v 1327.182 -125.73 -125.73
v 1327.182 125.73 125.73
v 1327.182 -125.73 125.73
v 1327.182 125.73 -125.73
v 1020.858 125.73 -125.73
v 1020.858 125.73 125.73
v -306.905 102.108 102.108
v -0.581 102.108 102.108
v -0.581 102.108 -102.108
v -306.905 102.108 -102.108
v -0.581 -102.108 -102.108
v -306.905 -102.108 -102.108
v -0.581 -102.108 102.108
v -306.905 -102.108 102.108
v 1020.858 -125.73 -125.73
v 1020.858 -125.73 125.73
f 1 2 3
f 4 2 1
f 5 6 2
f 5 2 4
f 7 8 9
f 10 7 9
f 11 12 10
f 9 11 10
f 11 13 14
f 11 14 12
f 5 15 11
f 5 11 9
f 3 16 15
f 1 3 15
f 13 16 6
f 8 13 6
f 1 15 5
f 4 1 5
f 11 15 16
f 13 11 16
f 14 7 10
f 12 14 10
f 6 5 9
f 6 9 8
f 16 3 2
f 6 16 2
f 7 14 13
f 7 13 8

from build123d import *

# Parameters (mm, degrees)
LOFT1_OUTLINE_W     = 204.216
LOFT1_OUTLINE_H     = 204.216
LOFT1_DEPTH         = 1021.439287055
LOFT1_DRAFT         = -1.324797
SKETCH3_2_W         = 251.46
SKETCH3_2_H         = 251.46
BOSS_EXTRUDE1_DEPTH = 306.324
SKETCH2_2_W         = 204.216
SKETCH2_2_H         = 204.216
BOSS_EXTRUDE2_DEPTH = 306.324


# Read off the part's stored shape, not the designer's step: Loft1
with BuildPart() as part:
    # Loft1 outline → Loft1 (with draft: the straight prism first)
    with BuildSketch(Plane.YZ.offset(-0.580963743)):
        Rectangle(LOFT1_OUTLINE_W, LOFT1_OUTLINE_H)
    extrude(amount=LOFT1_DEPTH)
    # Loft1: the draft: its side faces are tilted about the plane it starts from
    loft1_sides = [part.faces().sort_by_distance(p)[0] for p in [
        (510.138679785, 102.108, 0),
        (510.138679785, 0, 102.108),
        (510.138679785, -102.108, 0),
        (510.138679785, 0, -102.108),
    ]]
    draft(loft1_sides, Plane.YZ.offset(-0.580963743), LOFT1_DRAFT)

    # Sketch3<2> → Boss-Extrude1 (add)
    with BuildSketch(Plane(origin=(1020.858323313, 0, 0), x_dir=(0, 0, -1), z_dir=(1, 0, 0))):
        Rectangle(SKETCH3_2_W, SKETCH3_2_H)
    extrude(amount=BOSS_EXTRUDE1_DEPTH)

    # Sketch2<2> → Boss-Extrude2 (add)
    with BuildSketch(Plane(origin=(-0.580963743, 0, 0), x_dir=(0, 0, -1), z_dir=(1, 0, 0))):
        Rectangle(SKETCH2_2_W, SKETCH2_2_H)
    extrude(amount=-BOSS_EXTRUDE2_DEPTH)


solid = part.part
